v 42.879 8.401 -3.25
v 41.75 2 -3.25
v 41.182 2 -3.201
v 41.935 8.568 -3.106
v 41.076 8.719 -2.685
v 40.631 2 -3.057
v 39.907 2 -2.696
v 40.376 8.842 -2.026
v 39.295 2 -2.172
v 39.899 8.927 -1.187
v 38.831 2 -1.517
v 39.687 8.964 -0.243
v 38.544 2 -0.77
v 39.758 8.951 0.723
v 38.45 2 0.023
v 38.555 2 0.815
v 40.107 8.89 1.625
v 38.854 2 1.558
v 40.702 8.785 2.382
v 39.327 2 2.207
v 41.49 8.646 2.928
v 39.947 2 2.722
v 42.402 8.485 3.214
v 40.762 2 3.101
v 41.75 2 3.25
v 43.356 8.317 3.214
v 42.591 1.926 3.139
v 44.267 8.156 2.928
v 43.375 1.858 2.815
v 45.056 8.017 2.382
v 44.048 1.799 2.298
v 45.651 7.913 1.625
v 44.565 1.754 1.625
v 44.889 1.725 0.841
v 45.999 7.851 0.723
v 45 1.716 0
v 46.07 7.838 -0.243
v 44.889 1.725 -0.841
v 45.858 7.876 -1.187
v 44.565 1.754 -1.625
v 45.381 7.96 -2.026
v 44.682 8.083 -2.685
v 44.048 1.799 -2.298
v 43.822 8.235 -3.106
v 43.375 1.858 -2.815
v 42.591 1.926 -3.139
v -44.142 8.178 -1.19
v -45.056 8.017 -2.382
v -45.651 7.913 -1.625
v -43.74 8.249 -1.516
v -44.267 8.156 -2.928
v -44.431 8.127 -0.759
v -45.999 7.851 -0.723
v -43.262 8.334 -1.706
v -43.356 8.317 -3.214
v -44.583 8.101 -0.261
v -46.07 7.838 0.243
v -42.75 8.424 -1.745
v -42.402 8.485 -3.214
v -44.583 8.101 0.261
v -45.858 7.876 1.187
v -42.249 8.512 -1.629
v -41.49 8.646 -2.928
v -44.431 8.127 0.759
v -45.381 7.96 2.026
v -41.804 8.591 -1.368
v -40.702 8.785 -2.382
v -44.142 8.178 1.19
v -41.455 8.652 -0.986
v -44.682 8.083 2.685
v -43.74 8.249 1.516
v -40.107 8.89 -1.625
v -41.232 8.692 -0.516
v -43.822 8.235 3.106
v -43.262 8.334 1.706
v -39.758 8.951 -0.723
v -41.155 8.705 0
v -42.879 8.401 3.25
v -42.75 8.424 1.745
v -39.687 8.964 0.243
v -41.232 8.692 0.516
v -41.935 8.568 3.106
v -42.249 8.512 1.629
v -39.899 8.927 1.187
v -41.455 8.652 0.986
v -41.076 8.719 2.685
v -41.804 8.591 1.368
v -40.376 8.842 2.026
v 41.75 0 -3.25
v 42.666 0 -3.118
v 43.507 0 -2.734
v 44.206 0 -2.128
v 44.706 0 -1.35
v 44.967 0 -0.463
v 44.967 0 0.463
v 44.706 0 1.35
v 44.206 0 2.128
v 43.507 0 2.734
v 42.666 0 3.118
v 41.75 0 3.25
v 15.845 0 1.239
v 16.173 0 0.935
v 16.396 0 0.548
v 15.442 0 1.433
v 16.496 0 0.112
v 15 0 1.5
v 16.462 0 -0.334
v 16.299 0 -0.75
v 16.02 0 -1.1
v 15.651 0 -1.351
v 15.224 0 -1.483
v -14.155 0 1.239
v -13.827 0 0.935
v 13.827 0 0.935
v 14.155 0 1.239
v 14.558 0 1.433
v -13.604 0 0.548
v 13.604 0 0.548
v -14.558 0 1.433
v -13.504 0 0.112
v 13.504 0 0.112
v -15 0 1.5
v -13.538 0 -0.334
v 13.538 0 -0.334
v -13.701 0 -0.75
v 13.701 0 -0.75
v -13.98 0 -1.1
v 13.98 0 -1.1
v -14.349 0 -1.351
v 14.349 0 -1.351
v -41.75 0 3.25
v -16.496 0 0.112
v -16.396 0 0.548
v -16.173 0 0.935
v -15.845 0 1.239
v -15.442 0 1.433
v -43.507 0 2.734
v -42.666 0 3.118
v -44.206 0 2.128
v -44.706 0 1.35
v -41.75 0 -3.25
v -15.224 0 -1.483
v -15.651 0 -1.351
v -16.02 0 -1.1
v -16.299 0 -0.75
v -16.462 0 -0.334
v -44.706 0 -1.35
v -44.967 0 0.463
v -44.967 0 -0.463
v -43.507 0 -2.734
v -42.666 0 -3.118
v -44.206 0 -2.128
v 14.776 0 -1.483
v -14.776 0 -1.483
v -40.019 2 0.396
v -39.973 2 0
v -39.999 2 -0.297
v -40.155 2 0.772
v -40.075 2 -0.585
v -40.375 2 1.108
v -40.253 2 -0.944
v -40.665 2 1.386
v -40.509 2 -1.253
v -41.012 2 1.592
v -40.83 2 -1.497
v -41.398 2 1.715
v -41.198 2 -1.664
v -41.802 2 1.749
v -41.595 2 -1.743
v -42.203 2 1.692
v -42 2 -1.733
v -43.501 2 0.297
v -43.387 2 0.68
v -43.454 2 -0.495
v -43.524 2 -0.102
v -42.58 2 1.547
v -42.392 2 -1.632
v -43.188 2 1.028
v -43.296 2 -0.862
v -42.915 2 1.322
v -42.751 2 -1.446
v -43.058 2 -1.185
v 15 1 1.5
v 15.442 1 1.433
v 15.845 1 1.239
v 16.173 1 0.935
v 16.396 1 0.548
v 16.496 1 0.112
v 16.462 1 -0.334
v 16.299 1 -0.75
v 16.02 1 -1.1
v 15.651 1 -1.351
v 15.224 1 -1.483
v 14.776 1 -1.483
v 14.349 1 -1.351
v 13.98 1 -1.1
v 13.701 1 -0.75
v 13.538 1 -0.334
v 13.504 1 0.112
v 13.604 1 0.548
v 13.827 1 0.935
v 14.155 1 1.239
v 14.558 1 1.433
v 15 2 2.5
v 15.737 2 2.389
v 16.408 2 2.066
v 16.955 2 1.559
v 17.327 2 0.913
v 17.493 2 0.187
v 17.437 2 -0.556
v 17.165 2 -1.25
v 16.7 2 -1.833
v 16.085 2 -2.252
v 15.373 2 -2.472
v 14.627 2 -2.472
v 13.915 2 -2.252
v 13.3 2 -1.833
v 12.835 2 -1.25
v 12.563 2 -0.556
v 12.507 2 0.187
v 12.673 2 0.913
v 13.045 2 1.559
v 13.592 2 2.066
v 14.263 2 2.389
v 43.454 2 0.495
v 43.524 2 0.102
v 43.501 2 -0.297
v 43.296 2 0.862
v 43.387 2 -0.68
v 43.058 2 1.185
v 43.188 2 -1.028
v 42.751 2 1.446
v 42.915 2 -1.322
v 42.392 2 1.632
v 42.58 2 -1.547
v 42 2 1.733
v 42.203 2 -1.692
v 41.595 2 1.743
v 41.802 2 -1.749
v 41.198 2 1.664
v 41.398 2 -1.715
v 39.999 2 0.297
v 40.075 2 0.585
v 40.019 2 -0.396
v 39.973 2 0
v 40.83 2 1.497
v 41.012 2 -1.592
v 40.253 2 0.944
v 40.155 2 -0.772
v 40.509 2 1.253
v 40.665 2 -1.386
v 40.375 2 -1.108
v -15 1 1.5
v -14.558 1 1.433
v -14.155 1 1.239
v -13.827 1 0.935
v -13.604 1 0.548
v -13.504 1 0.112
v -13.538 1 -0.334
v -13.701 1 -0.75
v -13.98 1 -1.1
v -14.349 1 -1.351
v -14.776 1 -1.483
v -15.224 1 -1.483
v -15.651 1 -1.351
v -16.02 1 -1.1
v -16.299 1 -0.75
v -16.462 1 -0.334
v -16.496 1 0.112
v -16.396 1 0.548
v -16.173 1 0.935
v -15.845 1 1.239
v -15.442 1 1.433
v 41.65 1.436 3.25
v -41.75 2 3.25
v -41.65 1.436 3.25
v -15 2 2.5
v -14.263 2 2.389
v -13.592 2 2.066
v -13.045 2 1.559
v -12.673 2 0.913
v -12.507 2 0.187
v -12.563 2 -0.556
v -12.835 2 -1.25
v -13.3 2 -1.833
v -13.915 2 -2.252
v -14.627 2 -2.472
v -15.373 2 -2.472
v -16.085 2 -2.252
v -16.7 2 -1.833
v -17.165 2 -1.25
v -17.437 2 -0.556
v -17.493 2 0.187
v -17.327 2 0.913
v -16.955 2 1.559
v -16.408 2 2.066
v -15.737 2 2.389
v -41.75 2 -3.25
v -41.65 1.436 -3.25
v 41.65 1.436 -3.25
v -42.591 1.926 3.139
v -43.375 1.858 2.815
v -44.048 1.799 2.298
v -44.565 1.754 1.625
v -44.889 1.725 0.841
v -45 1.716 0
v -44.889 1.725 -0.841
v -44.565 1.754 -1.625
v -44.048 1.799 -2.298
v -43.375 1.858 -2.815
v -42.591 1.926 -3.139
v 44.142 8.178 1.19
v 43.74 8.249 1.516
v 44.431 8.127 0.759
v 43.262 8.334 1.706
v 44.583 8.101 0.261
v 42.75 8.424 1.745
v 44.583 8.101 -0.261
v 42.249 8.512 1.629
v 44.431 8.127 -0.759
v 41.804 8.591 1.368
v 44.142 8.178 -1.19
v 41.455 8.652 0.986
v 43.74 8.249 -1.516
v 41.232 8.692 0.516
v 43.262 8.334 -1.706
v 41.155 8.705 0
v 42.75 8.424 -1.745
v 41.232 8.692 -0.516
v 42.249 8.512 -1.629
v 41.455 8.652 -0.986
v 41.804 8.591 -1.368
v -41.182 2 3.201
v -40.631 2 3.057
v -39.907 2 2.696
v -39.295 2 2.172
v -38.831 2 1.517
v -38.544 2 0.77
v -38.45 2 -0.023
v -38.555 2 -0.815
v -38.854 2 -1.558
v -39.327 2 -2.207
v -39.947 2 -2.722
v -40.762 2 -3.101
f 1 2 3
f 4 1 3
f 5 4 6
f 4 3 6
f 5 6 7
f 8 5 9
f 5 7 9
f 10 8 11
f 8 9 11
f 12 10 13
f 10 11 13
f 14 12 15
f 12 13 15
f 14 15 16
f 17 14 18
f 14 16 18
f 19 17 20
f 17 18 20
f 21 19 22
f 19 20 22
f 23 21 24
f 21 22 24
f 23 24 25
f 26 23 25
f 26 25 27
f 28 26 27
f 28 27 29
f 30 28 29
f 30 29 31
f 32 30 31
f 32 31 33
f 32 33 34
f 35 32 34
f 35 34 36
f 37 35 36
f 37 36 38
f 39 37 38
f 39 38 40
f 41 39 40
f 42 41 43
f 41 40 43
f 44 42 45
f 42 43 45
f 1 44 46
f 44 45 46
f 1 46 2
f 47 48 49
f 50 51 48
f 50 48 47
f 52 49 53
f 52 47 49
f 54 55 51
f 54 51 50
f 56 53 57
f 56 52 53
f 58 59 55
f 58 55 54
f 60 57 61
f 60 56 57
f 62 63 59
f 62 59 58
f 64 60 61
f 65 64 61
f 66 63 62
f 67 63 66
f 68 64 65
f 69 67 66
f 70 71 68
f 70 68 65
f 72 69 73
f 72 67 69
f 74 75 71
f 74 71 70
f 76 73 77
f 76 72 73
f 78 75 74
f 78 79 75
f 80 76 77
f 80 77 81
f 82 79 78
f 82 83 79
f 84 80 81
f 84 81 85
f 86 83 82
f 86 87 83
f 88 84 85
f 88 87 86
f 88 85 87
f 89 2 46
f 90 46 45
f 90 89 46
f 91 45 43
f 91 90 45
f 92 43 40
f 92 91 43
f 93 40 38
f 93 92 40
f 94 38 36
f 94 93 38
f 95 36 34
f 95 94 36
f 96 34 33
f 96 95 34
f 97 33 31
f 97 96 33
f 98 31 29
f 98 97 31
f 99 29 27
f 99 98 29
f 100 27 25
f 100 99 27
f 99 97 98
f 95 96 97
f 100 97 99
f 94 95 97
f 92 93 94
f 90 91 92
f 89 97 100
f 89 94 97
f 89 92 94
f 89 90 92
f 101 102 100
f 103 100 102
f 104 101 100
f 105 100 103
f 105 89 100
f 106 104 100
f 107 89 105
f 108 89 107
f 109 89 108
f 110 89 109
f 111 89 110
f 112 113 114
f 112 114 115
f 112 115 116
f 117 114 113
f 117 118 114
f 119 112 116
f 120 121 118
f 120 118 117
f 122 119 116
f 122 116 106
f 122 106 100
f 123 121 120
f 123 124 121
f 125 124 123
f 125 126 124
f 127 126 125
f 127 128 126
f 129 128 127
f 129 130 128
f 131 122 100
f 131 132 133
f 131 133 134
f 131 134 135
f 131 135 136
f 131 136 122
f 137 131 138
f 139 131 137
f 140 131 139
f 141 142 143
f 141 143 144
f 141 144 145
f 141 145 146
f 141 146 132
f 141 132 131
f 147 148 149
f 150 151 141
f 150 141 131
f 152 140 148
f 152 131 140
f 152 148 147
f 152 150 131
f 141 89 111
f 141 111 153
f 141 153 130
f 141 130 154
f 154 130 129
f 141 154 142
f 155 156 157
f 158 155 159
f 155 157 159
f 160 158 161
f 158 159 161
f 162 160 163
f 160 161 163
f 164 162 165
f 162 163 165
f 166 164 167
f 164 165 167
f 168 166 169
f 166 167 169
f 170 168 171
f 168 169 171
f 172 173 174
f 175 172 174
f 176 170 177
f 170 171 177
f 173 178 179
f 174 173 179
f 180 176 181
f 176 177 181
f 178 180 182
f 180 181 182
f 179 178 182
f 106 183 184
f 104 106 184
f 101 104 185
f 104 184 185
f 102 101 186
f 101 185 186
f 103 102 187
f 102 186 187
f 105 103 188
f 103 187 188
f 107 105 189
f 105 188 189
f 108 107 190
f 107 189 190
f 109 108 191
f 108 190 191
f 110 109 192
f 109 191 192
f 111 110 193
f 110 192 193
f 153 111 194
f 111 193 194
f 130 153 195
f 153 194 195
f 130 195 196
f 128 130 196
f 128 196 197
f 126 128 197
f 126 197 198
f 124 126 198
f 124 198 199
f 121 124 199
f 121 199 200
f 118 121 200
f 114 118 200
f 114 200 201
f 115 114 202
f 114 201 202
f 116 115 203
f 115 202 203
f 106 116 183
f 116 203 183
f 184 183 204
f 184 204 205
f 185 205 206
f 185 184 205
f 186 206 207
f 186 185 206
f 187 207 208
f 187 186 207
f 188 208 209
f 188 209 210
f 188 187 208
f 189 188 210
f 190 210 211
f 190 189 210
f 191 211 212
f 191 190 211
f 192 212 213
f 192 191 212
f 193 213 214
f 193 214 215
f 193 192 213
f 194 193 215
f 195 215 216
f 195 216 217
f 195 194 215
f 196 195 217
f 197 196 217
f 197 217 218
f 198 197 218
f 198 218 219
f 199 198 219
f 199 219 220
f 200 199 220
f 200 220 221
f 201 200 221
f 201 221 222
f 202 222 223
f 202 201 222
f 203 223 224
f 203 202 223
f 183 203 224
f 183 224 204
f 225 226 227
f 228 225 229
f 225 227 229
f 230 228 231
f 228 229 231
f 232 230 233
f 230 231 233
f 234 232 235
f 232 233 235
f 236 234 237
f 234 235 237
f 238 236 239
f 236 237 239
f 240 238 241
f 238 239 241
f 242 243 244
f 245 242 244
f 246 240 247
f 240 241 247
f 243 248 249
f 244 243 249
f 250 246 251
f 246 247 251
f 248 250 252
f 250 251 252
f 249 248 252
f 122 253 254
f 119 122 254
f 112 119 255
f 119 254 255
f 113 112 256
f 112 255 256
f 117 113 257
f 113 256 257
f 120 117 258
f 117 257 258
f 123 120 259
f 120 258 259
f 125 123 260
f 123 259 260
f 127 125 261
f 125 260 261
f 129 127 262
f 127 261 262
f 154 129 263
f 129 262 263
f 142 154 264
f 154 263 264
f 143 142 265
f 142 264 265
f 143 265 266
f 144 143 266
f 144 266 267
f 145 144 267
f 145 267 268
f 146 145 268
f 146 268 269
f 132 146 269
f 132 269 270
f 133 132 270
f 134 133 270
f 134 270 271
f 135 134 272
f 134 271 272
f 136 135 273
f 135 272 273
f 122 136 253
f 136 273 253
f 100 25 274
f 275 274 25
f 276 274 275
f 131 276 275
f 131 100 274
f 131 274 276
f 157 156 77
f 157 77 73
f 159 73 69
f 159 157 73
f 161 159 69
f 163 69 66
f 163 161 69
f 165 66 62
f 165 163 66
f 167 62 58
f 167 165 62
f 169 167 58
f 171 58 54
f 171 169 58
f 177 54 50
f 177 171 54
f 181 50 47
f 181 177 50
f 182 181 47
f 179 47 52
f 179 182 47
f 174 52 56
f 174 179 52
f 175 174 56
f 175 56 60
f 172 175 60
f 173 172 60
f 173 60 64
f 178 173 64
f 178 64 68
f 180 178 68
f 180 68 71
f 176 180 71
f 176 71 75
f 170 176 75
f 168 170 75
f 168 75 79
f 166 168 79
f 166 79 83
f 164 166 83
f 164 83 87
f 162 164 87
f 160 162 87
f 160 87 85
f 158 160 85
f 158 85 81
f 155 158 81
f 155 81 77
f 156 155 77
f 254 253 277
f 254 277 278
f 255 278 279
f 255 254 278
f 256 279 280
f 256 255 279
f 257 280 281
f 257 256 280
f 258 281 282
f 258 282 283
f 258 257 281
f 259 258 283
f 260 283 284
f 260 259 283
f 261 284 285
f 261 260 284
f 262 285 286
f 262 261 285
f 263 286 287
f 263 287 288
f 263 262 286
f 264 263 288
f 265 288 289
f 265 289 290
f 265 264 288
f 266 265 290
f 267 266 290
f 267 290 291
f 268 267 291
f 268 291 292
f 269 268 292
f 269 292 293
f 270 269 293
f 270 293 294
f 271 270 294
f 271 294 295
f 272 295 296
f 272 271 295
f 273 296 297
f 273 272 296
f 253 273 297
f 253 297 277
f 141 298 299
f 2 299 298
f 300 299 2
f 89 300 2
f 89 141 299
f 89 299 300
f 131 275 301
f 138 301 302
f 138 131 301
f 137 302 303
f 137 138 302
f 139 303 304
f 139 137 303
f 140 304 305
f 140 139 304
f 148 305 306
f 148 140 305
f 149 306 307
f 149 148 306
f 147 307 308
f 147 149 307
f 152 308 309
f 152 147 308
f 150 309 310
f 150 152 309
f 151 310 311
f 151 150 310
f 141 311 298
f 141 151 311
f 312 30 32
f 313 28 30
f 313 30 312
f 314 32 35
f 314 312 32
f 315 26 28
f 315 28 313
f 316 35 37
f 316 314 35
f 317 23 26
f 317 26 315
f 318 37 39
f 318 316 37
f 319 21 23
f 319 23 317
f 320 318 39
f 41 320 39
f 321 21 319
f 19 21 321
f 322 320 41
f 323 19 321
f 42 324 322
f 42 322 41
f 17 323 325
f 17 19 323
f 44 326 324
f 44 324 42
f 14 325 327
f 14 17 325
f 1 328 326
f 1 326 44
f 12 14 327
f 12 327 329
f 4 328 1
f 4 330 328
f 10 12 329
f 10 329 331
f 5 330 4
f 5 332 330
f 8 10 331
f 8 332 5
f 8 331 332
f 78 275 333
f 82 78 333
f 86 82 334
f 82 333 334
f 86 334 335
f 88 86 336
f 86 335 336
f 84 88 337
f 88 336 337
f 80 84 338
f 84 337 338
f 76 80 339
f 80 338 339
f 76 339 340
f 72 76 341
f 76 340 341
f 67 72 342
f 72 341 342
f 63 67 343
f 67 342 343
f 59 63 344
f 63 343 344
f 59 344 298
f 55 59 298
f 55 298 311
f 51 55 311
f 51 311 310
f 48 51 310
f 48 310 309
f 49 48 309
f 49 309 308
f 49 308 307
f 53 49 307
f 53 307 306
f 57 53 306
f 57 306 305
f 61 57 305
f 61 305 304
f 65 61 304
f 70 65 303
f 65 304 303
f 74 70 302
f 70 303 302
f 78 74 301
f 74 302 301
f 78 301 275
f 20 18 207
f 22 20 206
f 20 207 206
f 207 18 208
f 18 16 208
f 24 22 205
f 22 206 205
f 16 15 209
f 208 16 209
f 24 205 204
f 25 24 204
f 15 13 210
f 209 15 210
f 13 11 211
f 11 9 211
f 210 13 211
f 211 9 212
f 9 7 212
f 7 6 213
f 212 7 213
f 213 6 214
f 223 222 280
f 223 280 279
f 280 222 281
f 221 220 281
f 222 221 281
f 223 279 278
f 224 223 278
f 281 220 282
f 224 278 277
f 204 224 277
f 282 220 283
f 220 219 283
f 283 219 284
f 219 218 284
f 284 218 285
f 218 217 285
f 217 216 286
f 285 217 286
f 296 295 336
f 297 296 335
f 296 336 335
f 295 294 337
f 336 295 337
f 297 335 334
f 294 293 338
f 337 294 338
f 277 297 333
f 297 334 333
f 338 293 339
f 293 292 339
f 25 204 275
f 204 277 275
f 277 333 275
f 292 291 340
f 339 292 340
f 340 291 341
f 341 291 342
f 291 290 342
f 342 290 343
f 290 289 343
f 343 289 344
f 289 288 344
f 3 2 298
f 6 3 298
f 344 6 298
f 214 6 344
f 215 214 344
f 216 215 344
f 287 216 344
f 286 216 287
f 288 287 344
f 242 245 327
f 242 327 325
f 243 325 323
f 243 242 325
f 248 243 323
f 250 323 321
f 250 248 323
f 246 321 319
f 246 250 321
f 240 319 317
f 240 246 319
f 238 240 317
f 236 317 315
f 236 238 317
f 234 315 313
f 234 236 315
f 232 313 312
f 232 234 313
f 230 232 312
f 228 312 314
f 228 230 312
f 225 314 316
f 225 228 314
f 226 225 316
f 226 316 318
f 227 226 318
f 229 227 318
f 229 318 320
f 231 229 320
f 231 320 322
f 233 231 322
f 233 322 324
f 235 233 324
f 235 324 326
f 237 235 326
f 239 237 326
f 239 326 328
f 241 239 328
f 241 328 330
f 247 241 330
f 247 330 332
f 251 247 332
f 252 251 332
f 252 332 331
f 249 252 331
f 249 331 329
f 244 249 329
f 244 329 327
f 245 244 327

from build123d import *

# Parameters (mm, degrees)
BOSS_EXTRUDE1_DEPTH = 2
BOSS_EXTRUDE2_START = -0.573063
SKETCH2_R           = 3.25
SKETCH2_R_2         = 1.75
BOSS_EXTRUDE2_DEPTH = 7.073063
BOSS_EXTRUDE3_START = -0.573063
SKETCH3_R           = 3.25
SKETCH3_R_2         = 1.75
BOSS_EXTRUDE3_DEPTH = 7.073063
SKETCH4_R           = 1.5
CUT_EXTRUDE1_DEPTH  = 2
CHAMFER1_SIZE       = 1


with BuildPart() as part:
    # Sketch1 → Boss-Extrude1 (new body)
    with BuildSketch(Plane(origin=(0, 0, 0), x_dir=(1, 0, 0), z_dir=(0, 1, 0))):
        with BuildLine():
            Line((-41.75, 3.25), (41.75, 3.25))
            ThreePointArc((41.75, 3.25), (45, 0), (41.75, -3.25))
            Line((41.75, -3.25), (-41.75, -3.25))
            ThreePointArc((-41.75, -3.25), (-45, 0), (-41.75, 3.25))
        make_face()
    extrude(amount=BOSS_EXTRUDE1_DEPTH)

    # Sketch2 → Boss-Extrude2 (add)
    with BuildSketch(Plane(origin=(-1.600936684, 9.079363113, 0), x_dir=(0, 0, -1), z_dir=(-0.17364817766693072, 0.984807753012208, 0)).offset(BOSS_EXTRUDE2_START)):
        with Locations(Location((0, 40.768427333, 0), (0, 0, 180))):
            Circle(SKETCH2_R)
        with Locations(Location((0, 40.768427333, 0), (0, 0, 270))):
            Circle(SKETCH2_R_2, mode=Mode.SUBTRACT)
    extrude(amount=BOSS_EXTRUDE2_DEPTH)

    # Sketch3 → Boss-Extrude3 (add)
    with BuildSketch(Plane(origin=(1.600936684, 9.079363113, 0), x_dir=(0, 0, -1), z_dir=(0.17364817766693072, 0.984807753012208, 0)).offset(BOSS_EXTRUDE3_START)):
        with Locations((0, -40.768427333)):
            Circle(SKETCH3_R)
        with Locations(Location((0, -40.768427333, 0), (0, 0, 90))):
            Circle(SKETCH3_R_2, mode=Mode.SUBTRACT)
    extrude(amount=BOSS_EXTRUDE3_DEPTH)

    # Sketch4 → Cut-Extrude1 (cut)
    with BuildSketch(Plane(origin=(0, 2, 0), x_dir=(1, 0, 0), z_dir=(0, 1, 0))):
        with Locations(Location((-15, 0, 0), (0, 0, 270))):
            Circle(SKETCH4_R)
        with Locations(Location((15, 0, 0), (0, 0, 270))):
            Circle(SKETCH4_R)
    extrude(amount=-CUT_EXTRUDE1_DEPTH, mode=Mode.SUBTRACT)

    # Chamfer1
    chamfer1_edges = [part.edges().sort_by_distance(p)[0] for p in [
        (-15, 2, -1.5),
        (15, 2, -1.5),
    ]]
    chamfer(chamfer1_edges, length=CHAMFER1_SIZE)


solid = part.part
